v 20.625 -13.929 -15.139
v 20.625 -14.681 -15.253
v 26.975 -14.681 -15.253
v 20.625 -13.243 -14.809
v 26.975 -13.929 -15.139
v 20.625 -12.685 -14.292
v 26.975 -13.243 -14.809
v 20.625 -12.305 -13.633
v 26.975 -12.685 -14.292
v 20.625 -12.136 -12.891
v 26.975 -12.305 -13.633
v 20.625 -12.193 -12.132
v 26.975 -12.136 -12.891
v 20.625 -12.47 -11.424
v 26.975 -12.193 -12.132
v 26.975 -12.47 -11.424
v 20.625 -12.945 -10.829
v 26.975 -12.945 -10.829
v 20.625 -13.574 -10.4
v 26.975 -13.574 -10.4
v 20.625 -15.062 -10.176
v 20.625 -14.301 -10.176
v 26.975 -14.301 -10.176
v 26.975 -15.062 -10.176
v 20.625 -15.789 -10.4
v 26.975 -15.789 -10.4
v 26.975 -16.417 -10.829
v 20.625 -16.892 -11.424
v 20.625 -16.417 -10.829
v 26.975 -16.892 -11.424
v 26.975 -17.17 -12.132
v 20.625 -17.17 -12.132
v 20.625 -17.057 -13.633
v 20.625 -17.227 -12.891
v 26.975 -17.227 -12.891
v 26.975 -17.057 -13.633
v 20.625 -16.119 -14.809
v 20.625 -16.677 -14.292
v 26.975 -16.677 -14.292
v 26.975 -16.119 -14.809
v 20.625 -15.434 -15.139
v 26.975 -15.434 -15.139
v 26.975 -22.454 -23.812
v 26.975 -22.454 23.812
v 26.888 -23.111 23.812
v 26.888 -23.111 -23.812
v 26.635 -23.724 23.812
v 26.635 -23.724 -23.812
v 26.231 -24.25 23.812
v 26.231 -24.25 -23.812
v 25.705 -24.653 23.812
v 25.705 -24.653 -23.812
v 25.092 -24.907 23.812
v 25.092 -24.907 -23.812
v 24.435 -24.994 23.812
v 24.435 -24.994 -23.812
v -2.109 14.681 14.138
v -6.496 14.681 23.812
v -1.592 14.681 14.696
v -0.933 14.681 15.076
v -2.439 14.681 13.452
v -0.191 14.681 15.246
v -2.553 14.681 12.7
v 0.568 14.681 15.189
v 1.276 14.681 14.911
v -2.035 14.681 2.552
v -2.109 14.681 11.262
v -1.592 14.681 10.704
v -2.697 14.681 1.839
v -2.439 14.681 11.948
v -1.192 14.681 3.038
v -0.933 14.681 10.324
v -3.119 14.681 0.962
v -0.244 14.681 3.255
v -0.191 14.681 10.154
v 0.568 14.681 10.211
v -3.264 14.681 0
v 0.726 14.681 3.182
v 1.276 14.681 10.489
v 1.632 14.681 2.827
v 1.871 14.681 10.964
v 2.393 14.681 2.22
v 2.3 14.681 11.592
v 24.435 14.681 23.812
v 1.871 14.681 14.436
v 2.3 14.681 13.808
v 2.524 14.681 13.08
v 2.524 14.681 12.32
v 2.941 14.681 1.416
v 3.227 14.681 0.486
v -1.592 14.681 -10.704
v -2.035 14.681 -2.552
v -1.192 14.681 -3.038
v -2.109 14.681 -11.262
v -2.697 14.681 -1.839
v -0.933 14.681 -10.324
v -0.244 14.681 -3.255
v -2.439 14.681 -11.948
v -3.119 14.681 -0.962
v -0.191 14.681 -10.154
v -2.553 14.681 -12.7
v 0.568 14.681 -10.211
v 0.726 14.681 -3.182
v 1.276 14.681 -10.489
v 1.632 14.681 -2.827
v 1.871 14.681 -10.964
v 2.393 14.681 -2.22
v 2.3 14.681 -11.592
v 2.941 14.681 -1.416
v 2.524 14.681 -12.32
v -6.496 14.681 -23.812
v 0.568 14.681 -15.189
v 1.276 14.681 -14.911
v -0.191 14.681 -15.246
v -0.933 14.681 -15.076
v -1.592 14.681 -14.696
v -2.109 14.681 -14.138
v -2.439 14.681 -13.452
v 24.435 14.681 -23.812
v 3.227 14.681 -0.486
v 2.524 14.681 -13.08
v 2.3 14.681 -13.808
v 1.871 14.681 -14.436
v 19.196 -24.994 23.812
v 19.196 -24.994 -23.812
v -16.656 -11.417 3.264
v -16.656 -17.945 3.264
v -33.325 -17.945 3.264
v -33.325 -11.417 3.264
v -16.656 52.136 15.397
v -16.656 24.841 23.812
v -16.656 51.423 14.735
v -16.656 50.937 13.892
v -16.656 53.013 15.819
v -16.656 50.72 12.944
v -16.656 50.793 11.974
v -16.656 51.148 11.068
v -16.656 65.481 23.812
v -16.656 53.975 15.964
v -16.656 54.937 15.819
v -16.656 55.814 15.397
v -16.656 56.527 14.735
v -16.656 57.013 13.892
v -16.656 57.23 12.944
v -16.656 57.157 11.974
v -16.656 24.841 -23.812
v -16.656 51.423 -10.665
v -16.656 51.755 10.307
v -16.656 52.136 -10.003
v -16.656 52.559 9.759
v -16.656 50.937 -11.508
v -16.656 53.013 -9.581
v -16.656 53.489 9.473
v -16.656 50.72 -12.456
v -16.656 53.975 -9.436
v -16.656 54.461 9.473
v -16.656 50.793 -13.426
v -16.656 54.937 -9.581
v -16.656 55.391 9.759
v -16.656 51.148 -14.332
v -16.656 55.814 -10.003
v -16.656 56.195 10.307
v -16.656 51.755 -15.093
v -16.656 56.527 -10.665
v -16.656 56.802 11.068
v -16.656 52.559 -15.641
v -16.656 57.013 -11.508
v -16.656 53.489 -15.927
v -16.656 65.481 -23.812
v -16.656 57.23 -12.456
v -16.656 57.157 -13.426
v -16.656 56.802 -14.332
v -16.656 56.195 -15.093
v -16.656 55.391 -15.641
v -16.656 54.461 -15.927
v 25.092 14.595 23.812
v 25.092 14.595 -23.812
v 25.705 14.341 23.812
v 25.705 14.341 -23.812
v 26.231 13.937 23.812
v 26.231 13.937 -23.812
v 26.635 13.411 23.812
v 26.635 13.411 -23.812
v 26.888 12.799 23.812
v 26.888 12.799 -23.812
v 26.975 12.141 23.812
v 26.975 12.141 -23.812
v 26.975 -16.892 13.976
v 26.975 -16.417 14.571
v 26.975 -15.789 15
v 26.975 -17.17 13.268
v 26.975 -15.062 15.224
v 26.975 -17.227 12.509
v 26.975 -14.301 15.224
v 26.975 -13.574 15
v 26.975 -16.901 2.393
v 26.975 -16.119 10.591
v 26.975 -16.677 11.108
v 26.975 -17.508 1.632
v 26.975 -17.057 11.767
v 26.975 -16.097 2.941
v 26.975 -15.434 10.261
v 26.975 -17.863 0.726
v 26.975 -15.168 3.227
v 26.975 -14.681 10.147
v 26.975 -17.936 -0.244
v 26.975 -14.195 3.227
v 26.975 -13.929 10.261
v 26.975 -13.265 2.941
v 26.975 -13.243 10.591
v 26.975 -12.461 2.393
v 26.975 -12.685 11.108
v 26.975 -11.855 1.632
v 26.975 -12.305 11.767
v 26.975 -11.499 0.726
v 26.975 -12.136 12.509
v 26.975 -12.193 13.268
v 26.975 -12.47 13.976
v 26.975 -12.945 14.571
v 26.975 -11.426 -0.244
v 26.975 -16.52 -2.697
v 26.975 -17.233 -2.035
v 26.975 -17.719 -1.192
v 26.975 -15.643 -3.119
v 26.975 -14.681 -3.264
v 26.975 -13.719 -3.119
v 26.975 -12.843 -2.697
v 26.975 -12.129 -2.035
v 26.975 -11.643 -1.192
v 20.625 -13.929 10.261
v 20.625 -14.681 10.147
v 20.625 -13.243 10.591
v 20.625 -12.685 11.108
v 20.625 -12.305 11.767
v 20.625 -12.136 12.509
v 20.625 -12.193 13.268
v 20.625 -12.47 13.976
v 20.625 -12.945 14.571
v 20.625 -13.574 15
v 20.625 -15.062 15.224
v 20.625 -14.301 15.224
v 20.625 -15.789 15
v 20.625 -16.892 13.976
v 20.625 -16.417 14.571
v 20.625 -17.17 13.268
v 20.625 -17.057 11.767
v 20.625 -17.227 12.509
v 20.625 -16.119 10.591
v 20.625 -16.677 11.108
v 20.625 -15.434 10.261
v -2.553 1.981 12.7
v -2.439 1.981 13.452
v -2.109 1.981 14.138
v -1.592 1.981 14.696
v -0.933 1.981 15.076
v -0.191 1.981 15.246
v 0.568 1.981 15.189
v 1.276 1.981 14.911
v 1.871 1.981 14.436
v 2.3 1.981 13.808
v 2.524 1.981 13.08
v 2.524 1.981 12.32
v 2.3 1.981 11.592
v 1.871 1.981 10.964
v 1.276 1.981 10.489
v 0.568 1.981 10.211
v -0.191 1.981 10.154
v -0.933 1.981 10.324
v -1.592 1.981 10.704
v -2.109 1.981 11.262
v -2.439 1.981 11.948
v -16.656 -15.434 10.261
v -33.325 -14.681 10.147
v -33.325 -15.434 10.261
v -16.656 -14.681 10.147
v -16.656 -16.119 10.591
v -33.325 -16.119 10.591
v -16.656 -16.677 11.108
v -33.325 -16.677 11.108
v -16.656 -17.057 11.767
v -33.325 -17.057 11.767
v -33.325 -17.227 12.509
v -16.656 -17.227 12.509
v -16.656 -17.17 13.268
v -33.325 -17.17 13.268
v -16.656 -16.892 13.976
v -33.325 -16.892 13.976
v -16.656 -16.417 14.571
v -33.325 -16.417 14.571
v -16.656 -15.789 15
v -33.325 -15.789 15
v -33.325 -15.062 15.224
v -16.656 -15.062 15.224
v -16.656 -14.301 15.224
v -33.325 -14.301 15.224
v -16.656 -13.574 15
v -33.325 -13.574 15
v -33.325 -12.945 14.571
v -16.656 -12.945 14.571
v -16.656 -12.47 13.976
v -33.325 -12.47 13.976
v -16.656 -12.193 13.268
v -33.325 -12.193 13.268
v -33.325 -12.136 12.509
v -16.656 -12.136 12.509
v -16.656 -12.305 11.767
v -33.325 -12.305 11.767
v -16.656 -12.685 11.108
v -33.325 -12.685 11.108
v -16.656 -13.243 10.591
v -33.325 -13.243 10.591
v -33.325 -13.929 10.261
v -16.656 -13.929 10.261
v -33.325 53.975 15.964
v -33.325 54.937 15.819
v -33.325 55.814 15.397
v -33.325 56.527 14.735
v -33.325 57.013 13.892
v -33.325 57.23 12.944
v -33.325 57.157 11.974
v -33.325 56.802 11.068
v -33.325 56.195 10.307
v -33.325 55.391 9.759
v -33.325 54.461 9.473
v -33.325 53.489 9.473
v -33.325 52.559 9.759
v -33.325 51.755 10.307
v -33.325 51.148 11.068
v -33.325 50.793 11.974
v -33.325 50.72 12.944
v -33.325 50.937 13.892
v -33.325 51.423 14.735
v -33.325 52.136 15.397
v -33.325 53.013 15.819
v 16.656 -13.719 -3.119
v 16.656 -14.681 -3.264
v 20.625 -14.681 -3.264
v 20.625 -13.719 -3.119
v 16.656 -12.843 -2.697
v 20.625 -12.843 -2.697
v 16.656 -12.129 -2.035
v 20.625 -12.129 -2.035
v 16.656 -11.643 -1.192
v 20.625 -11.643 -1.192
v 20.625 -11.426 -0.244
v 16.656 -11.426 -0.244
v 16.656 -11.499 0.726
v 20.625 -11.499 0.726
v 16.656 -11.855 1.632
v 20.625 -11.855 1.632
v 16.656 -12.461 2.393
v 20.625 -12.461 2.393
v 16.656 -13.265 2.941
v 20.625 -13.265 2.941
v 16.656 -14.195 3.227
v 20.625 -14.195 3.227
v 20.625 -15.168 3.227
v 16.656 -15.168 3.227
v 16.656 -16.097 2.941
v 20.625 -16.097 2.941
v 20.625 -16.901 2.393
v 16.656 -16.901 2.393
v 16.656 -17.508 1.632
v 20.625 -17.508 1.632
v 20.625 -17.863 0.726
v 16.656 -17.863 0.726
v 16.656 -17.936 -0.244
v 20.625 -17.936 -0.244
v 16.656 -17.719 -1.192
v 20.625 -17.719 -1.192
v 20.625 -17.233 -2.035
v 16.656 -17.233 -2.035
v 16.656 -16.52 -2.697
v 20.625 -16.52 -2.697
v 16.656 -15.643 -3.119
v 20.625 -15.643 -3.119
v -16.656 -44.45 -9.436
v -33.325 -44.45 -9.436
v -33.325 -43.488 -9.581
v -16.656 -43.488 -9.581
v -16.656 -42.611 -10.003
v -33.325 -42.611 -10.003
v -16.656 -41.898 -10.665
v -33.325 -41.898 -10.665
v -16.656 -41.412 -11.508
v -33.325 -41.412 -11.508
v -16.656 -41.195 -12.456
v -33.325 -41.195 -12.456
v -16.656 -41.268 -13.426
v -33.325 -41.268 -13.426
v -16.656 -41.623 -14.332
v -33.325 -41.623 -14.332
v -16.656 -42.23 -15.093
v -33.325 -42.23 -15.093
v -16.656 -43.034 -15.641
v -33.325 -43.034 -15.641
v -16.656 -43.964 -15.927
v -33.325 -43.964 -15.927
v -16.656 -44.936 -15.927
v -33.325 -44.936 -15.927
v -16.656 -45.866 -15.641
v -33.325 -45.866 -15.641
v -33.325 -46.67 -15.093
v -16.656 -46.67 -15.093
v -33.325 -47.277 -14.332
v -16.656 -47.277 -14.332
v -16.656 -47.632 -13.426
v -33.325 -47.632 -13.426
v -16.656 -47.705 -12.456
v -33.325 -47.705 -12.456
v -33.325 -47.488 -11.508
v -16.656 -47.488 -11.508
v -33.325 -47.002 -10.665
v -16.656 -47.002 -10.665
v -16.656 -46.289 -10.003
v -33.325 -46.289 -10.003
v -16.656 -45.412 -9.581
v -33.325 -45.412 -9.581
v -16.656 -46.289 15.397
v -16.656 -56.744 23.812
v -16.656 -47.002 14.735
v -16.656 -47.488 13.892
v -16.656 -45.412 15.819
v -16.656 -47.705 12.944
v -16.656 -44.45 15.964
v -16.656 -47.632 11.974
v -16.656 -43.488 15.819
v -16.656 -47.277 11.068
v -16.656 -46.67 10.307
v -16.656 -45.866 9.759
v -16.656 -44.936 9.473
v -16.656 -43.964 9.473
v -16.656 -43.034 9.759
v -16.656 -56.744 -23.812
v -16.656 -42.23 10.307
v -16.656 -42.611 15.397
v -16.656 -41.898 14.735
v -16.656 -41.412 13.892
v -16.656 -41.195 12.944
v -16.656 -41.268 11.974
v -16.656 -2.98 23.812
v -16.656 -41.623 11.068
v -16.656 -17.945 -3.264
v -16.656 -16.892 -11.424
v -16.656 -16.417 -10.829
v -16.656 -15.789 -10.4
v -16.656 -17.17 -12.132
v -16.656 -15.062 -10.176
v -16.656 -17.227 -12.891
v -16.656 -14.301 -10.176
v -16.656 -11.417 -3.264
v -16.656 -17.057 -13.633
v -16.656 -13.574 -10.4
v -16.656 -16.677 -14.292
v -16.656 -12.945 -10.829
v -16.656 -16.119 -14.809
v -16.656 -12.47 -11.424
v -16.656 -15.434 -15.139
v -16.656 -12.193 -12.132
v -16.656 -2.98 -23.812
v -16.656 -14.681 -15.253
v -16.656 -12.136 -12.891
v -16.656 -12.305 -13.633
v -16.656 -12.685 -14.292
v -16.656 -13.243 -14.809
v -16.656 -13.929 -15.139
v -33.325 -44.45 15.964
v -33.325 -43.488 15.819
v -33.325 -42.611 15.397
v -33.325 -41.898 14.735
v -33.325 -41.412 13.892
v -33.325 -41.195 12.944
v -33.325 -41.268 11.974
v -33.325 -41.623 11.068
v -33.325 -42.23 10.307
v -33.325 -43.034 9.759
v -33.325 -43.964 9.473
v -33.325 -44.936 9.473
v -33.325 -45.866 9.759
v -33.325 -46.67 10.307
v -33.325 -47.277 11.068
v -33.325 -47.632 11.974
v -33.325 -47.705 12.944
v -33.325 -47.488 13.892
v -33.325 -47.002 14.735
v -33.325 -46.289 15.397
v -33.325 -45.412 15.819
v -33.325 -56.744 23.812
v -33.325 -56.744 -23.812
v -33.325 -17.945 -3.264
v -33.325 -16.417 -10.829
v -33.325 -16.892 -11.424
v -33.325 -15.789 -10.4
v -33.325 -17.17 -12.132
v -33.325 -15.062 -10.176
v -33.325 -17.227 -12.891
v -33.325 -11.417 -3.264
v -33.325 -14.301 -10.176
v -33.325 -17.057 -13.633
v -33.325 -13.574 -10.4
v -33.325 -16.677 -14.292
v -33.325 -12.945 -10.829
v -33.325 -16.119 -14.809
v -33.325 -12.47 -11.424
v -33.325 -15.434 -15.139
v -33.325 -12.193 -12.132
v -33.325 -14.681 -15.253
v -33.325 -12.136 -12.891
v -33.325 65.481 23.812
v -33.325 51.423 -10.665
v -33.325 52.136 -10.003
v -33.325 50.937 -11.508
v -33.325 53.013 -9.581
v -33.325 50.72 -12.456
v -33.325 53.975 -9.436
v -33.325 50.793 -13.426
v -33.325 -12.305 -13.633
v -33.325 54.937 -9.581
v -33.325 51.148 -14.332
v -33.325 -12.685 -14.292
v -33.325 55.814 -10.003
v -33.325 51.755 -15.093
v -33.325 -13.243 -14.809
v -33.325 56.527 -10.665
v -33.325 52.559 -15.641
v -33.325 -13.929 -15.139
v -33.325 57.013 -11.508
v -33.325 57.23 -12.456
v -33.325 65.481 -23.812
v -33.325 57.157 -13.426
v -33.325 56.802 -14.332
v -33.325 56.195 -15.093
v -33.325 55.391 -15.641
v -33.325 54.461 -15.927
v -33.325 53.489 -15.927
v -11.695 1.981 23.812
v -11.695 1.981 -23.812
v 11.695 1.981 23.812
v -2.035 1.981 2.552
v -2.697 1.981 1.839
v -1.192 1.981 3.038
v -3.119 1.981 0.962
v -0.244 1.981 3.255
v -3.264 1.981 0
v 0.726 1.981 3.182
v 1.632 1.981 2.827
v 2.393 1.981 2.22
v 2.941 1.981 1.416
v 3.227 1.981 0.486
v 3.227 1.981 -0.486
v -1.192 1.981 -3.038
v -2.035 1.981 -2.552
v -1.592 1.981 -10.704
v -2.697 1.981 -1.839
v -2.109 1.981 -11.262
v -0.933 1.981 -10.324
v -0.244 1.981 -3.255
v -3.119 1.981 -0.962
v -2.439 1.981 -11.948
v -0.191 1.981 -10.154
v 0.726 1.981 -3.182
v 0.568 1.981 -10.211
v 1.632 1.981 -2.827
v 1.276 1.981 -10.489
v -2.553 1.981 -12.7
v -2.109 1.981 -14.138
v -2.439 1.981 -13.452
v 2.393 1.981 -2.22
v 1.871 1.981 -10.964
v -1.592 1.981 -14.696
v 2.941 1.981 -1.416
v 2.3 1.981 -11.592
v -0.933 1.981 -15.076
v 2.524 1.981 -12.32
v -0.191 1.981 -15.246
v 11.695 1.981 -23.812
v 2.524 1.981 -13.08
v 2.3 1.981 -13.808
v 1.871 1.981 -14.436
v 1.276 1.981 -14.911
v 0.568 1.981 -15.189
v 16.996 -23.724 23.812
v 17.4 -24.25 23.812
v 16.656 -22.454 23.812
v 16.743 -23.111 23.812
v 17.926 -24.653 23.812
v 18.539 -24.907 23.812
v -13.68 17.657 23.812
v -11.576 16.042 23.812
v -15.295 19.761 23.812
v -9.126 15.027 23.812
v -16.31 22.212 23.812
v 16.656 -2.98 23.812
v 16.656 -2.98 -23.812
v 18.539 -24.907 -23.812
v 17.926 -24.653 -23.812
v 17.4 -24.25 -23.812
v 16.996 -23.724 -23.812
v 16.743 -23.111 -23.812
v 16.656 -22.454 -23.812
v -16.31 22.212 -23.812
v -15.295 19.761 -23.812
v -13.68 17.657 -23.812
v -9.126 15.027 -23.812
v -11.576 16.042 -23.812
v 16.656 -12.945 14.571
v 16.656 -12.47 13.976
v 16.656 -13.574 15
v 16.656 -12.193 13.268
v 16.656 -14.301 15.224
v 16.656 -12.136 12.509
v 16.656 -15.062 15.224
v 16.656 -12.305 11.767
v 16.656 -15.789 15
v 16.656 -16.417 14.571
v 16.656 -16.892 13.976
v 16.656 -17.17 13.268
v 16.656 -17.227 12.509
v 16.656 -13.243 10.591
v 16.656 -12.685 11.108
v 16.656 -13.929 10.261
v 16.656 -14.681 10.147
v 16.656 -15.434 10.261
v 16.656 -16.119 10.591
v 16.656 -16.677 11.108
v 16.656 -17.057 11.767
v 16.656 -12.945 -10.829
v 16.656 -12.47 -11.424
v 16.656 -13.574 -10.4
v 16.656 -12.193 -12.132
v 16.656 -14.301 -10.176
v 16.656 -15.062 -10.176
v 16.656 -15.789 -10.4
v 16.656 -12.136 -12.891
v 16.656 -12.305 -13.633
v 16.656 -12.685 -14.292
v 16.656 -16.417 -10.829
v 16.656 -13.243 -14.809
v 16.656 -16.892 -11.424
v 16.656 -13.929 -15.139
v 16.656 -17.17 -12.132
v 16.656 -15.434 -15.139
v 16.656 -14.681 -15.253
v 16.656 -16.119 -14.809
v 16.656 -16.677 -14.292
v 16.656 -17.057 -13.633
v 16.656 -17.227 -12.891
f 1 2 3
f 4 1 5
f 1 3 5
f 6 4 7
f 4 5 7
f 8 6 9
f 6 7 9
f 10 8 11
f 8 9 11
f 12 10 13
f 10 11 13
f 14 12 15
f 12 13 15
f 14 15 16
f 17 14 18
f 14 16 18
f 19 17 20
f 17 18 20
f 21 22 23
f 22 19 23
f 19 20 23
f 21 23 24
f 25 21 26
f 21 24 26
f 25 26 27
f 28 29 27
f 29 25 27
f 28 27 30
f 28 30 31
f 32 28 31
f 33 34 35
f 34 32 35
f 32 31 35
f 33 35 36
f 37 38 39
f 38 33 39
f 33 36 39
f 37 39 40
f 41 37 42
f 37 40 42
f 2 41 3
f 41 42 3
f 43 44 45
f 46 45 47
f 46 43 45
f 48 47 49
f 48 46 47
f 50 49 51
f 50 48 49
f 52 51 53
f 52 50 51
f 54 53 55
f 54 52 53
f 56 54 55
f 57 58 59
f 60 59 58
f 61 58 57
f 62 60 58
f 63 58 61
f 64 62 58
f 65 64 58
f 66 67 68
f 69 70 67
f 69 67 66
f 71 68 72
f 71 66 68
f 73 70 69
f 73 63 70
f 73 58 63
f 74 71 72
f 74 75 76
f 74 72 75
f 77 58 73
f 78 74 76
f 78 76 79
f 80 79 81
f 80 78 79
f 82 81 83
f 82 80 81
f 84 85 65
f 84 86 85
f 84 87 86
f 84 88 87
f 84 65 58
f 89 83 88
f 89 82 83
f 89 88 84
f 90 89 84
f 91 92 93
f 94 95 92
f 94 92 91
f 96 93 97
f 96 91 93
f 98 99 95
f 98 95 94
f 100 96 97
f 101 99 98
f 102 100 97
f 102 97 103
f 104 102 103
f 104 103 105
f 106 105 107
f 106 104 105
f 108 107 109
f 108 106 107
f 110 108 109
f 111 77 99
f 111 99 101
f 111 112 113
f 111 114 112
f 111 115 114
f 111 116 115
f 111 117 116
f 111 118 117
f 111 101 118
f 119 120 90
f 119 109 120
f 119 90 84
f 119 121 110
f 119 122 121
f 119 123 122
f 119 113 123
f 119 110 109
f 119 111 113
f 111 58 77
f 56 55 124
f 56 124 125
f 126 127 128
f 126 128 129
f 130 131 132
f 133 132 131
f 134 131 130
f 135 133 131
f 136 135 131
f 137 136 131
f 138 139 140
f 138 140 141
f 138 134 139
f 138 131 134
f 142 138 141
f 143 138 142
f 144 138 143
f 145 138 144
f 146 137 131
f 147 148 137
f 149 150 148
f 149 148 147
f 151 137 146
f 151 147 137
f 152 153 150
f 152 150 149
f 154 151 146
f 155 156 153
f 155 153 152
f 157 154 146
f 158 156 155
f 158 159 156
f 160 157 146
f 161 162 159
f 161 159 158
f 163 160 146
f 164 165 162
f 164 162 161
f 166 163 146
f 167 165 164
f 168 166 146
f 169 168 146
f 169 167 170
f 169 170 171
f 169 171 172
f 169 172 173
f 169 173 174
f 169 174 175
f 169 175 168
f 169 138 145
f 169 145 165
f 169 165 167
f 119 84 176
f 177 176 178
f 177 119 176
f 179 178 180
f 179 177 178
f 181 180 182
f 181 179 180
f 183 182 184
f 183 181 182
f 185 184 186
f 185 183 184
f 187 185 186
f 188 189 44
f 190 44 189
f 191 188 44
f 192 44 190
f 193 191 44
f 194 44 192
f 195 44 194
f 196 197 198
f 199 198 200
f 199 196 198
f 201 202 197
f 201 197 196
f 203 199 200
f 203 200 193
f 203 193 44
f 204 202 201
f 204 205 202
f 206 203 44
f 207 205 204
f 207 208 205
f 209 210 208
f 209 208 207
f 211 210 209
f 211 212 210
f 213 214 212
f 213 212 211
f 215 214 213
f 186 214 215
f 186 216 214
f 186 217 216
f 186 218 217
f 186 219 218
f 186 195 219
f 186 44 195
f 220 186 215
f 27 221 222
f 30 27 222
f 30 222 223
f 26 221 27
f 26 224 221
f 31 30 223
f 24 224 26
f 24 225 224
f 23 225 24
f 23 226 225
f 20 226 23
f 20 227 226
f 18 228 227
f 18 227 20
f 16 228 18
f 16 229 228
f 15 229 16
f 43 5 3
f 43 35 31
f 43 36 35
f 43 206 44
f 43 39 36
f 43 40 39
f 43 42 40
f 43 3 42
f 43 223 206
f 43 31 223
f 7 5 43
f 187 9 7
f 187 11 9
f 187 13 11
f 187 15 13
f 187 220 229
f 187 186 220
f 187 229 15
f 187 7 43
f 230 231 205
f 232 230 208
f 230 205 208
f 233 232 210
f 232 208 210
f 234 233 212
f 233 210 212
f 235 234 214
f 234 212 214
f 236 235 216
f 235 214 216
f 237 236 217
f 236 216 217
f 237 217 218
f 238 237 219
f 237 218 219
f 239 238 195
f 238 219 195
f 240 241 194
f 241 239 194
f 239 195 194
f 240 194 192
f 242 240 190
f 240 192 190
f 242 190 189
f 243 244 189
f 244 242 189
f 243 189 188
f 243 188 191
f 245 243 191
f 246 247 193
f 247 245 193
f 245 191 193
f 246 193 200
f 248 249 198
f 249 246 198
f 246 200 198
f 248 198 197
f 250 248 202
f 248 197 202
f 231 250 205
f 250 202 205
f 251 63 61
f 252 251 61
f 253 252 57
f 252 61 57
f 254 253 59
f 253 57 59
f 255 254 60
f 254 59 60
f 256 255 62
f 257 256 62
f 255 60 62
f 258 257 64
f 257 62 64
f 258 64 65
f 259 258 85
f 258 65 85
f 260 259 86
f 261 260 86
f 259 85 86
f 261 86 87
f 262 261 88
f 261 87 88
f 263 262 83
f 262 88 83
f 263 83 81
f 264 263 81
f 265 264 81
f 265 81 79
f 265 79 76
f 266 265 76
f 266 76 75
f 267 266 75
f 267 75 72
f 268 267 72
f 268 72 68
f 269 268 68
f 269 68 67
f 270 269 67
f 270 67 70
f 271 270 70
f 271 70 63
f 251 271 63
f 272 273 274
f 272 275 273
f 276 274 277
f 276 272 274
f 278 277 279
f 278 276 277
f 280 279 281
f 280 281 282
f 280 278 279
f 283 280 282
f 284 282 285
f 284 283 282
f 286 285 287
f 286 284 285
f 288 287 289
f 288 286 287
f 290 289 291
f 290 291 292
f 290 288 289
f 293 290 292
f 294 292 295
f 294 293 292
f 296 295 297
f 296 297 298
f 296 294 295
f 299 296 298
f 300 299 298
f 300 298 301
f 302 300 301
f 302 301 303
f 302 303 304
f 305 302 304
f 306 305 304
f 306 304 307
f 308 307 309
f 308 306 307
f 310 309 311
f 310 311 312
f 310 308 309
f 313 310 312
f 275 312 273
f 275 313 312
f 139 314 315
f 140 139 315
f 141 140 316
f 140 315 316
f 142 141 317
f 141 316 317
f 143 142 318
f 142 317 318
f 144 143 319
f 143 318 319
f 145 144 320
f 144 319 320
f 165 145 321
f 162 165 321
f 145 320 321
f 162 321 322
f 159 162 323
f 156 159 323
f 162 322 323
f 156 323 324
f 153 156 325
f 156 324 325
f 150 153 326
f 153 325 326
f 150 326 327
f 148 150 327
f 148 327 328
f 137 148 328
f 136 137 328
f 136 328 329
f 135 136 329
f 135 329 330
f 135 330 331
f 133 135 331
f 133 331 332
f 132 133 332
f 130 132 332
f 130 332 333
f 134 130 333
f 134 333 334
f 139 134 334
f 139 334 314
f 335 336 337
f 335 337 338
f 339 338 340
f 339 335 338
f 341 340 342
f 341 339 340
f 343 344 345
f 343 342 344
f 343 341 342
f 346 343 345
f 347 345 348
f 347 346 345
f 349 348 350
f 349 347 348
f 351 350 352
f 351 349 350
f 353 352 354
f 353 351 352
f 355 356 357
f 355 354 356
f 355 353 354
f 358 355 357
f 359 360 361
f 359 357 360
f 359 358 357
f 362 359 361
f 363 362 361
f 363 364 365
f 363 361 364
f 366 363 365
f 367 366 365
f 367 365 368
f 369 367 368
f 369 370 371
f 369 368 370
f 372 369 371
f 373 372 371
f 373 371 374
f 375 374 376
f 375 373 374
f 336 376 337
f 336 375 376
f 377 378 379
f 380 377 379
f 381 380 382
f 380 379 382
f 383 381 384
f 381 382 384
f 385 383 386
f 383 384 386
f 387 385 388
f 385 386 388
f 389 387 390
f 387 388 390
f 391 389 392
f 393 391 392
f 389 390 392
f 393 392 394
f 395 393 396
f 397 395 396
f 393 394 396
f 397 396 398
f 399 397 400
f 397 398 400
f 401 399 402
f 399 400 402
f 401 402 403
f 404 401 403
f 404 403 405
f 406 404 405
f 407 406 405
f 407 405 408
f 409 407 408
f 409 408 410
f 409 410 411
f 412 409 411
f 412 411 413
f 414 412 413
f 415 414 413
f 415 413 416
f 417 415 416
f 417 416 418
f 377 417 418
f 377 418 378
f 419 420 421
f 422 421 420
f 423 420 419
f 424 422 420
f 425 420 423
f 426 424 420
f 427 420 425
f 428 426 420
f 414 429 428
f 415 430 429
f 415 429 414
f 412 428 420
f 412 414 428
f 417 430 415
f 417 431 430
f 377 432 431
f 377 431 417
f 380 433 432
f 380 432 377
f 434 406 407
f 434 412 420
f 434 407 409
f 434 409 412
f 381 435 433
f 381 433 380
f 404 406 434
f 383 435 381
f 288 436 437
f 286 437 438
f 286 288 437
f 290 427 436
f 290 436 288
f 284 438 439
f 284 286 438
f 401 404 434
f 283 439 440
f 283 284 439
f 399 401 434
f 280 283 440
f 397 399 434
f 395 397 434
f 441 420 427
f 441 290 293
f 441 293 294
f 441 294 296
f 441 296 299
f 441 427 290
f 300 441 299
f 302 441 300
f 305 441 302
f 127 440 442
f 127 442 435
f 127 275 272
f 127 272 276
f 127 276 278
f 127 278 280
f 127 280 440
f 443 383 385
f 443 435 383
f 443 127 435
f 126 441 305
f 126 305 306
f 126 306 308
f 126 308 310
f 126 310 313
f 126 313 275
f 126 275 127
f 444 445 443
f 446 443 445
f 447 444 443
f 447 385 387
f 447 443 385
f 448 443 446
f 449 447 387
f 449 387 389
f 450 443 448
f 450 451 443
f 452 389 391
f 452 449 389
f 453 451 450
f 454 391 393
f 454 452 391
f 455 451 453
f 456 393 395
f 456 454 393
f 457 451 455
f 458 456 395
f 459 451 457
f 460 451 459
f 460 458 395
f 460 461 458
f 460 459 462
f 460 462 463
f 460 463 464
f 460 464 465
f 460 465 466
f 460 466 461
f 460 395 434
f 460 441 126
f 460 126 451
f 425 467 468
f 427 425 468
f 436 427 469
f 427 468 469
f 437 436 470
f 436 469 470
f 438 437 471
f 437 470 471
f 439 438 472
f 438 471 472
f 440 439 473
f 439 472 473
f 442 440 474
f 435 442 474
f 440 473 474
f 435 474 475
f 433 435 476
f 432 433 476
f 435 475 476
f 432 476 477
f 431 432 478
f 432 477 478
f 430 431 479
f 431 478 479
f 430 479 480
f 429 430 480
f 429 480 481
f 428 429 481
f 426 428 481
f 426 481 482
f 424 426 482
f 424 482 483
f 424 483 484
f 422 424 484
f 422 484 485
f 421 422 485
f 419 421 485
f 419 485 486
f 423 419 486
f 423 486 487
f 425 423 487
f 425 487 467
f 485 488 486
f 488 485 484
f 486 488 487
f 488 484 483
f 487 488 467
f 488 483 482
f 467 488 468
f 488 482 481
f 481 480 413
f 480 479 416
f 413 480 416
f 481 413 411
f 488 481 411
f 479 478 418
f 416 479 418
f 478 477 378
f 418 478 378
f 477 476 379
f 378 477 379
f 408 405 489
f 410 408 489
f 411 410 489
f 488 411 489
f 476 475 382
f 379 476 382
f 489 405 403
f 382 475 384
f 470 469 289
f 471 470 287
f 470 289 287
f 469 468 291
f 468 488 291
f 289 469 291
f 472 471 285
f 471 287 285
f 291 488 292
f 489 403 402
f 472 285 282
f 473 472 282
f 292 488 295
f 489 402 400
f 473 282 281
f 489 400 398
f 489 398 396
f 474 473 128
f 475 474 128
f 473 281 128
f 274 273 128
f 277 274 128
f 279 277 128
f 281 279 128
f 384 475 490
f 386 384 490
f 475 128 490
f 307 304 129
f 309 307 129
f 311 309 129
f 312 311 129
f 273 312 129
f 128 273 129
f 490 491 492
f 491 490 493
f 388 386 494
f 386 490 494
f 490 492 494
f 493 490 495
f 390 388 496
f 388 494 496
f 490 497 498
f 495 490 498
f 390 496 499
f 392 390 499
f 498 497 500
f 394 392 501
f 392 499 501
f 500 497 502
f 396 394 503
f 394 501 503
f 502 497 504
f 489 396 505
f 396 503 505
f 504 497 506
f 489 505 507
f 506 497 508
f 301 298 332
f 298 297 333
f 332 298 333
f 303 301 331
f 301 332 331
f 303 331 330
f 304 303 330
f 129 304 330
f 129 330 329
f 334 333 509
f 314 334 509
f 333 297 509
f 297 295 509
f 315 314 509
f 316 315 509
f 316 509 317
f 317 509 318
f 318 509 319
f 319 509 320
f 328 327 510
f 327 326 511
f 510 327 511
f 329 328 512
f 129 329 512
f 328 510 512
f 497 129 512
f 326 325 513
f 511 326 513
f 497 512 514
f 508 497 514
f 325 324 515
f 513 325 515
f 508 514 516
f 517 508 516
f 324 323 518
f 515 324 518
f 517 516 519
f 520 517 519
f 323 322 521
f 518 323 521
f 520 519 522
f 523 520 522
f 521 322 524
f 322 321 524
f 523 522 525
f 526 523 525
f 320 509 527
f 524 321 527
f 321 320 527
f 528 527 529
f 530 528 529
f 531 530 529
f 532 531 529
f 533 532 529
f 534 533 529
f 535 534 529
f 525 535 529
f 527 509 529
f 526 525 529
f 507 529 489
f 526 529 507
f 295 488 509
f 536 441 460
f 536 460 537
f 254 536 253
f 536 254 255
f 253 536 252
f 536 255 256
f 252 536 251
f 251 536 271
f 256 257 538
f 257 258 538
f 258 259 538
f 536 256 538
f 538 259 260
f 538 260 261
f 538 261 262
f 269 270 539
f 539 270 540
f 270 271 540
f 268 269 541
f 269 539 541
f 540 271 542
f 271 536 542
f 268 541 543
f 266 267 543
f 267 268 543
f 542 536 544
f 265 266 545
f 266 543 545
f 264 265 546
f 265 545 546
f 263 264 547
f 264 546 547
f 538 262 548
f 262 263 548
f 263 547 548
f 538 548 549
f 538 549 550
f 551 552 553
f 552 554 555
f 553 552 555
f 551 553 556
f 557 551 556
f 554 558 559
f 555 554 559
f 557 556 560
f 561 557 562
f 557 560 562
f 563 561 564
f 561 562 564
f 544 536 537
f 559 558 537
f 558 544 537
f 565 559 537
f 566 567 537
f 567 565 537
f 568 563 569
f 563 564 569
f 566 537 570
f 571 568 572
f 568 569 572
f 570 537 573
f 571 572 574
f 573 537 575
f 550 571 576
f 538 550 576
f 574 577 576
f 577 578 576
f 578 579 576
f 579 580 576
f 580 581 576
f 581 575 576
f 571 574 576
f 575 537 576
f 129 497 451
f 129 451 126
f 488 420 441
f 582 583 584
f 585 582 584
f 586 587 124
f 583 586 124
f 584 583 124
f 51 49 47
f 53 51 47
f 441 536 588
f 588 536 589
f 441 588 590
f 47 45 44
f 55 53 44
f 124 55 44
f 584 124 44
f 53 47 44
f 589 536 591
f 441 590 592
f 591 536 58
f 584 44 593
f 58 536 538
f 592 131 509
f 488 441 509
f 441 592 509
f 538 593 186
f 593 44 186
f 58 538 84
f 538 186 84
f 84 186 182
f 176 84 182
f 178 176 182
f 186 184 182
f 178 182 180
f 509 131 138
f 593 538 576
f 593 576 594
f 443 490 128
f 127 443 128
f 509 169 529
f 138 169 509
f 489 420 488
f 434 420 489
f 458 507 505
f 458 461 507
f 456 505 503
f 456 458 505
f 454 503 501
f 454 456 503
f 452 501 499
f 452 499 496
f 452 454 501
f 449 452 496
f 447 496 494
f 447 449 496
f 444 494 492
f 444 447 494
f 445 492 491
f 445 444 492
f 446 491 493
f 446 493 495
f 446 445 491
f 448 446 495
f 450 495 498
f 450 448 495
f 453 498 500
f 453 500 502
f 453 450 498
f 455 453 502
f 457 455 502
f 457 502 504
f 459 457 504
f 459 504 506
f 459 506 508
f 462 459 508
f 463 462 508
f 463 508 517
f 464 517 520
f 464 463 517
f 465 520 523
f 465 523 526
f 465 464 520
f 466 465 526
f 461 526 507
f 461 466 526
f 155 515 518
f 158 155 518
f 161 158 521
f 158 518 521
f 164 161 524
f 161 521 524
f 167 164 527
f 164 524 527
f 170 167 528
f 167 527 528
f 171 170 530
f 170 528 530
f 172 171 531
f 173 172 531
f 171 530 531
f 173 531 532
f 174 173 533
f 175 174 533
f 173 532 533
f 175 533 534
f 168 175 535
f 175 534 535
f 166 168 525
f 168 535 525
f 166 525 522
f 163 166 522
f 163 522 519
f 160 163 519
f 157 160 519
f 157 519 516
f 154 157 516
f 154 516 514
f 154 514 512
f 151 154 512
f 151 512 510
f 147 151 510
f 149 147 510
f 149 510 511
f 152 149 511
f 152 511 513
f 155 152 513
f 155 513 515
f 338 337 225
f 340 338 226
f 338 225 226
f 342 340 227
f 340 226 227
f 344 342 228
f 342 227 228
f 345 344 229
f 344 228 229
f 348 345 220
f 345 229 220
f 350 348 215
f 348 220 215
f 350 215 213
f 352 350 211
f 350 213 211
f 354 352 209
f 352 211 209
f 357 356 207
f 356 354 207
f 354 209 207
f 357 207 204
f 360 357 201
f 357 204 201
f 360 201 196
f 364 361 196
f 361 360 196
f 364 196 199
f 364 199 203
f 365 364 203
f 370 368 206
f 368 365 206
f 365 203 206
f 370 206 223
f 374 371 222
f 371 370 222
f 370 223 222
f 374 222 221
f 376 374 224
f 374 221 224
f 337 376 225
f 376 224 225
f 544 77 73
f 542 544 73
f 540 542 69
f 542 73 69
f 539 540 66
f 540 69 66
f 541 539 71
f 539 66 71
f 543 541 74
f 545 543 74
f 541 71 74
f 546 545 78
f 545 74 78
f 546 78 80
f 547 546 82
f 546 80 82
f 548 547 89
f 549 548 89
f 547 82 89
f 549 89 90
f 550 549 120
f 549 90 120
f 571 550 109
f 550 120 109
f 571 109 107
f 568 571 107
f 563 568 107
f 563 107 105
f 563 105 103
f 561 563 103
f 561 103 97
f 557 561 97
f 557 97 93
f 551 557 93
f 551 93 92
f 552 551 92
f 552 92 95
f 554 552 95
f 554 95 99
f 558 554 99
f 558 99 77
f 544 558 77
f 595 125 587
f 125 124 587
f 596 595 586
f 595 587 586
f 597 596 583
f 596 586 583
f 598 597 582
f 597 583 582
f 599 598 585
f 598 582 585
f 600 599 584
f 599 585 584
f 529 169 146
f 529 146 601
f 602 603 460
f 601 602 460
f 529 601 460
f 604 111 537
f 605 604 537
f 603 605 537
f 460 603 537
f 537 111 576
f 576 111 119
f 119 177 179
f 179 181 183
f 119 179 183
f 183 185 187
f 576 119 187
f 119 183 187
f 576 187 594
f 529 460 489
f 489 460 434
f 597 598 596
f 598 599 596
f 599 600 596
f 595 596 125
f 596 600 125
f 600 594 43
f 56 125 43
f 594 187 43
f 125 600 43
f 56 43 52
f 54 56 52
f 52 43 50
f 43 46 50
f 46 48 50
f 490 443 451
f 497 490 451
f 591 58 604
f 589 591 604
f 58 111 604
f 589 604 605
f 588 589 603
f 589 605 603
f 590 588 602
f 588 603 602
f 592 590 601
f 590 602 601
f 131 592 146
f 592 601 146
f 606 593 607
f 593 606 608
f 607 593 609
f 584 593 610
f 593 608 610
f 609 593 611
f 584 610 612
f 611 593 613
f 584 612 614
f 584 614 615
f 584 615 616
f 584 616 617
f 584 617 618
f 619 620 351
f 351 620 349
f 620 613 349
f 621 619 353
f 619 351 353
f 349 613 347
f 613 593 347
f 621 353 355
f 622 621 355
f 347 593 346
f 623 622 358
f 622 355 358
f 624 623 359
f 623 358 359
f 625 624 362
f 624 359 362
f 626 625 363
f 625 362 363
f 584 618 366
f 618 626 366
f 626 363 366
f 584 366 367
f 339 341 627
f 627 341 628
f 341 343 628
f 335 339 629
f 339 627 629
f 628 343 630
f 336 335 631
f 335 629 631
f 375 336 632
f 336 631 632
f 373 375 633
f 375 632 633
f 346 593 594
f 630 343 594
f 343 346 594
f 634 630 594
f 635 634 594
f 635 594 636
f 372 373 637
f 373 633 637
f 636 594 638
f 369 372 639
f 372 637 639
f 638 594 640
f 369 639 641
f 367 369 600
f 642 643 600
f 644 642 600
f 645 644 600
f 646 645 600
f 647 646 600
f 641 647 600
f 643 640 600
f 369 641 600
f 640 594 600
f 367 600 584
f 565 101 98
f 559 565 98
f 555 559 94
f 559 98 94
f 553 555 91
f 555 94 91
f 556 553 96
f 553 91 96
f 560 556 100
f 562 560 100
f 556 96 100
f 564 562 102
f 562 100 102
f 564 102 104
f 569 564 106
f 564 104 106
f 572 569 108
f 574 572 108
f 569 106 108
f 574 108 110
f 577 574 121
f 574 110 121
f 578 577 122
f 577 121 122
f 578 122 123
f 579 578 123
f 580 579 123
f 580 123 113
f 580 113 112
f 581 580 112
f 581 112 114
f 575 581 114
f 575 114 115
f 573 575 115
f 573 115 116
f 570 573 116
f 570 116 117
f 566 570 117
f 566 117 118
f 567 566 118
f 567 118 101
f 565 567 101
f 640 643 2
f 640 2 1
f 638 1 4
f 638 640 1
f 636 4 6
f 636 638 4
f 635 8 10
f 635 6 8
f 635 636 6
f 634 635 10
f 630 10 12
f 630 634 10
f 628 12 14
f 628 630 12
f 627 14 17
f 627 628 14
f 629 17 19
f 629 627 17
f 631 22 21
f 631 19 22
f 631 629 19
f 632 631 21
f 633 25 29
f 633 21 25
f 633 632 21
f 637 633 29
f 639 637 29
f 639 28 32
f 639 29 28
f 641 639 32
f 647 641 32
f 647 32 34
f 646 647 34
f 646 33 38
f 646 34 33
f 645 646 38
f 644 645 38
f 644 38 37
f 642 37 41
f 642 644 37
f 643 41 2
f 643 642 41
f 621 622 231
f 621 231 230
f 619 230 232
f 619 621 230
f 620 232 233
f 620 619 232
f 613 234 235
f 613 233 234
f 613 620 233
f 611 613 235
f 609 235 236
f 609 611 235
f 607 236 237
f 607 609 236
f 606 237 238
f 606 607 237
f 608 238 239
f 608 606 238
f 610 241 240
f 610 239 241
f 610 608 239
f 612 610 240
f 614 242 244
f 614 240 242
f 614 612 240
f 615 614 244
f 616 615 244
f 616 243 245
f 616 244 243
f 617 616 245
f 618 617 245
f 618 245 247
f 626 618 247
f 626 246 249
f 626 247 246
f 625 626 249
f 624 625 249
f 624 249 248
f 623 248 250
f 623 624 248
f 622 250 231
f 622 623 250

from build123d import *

# Parameters (mm, degrees)
BOSS_EXTRUDE1_DEPTH      = 23.8125
BOSS_EXTRUDE1_DEPTH_BACK = 23.8125
CUT_EXTRUDE1_DEPTH       = 41.213151732
CUT_EXTRUDE1_DEPTH_BACK  = 41.213151732
SKETCH6_R                = 2.5527
SKETCH6_R_2              = 3.2639
SKETCH7_R                = 1.5875
SKETCH7_W                = 6.5278
SKETCH7_H                = 6.5278
CUT_EXTRUDE2_DEPTH       = 41.213151732
SKETCH8_R                = 2.5527
CUT_EXTRUDE3_DEPTH       = 6.35
SKETCH14_R               = 3.2639
CUT_EXTRUDE6_DEPTH       = 46.858039931
SKETCH15_W               = 47.625
SKETCH15_H               = 33.3248
SKETCH15_R               = 2.5527
SKETCH15_W_2             = 6.5278
SKETCH15_H_2             = 6.5278
BOSS_EXTRUDE2_DEPTH      = 6.35
BOSS_EXTRUDE3_START      = 6.35
SKETCH16_W               = 47.625
SKETCH16_H               = 33.3248
SKETCH16_R               = 2.5527
SKETCH16_R_2             = 3.2639
BOSS_EXTRUDE3_DEPTH      = 6.35
BOSS_EXTRUDE4_START      = 6.35
SKETCH17_W               = 53.9496
SKETCH17_H               = 47.625
SKETCH17_R               = 2.5527
SKETCH17_R_2             = 3.2639
BOSS_EXTRUDE4_DEPTH      = 6.35
BOSS_EXTRUDE5_DEPTH      = 6.35
BOSS_EXTRUDE5_DEPTH_BACK = 10.31875
SKETCH19_R               = 2.5527
SKETCH19_W               = 6.5278
SKETCH19_H               = 6.5278
FILLET2_R                = 10.16
FILLET3_R                = 2.54
SKETCH20_R               = 3.2639
CUT_EXTRUDE7_DEPTH       = 93.145886885


with BuildPart() as part:
    # Sketch4 → Boss-Extrude1 (new, two sides: drawn at the far end of the back side and taken through both)
    with BuildSketch(Plane.XY.offset(-BOSS_EXTRUDE1_DEPTH_BACK)):
        Polygon((-20.6248, -24.9936), (-16.65605, -24.9936), (-16.65605, -2.9797375), (-11.6951125, 1.9812), (11.6951125, 1.9812), (16.65605, -2.9797375), (16.65605, -24.9936), (20.6248, -24.9936), (20.6248, 8.3312), (-20.6248, 8.3312), align=None)
    extrude(amount=BOSS_EXTRUDE1_DEPTH + BOSS_EXTRUDE1_DEPTH_BACK)

    # Sketch6 → Cut-Extrude1 (cut, two sides: drawn at the far end of the back side and taken through both)
    with BuildSketch(Plane(origin=(0, 0, 0), x_dir=(0, 0, -1), z_dir=(1, 0, 0)).offset(-CUT_EXTRUDE1_DEPTH_BACK)):
        with Locations((-12.7, -14.6812)):
            Circle(SKETCH6_R)
        with Locations((0, -14.6812)):
            Circle(SKETCH6_R_2)
        with Locations((12.7, -14.6812)):
            Circle(SKETCH6_R)
        with Locations((12.7, 16.6624)):
            Circle(SKETCH6_R_2)
        with Locations((-12.7, 16.6624)):
            Circle(SKETCH6_R_2)
    extrude(amount=CUT_EXTRUDE1_DEPTH + CUT_EXTRUDE1_DEPTH_BACK, mode=Mode.SUBTRACT)

    # Sketch7 → Cut-Extrude2 (cut, through all)
    with BuildSketch(Plane(origin=(0, 0, 0), x_dir=(0, 0, -1), z_dir=(1, 0, 0))):
        with Locations((-12.7, -14.6812)):
            Circle(SKETCH7_R)
        with Locations((12.7, -14.6812)):
            Circle(SKETCH7_R)
        with Locations((0, -14.6812)):
            Rectangle(SKETCH7_W, SKETCH7_H)
    extrude(amount=-CUT_EXTRUDE2_DEPTH, mode=Mode.SUBTRACT)

    # Sketch8 → Cut-Extrude3 (cut)
    with BuildSketch(Plane(origin=(0, 8.3312, 0), x_dir=(1, 0, 0), z_dir=(0, 1, 0))):
        with Locations(Location((0, 12.7, 0), (0, 0, 180))):
            Circle(SKETCH8_R)
        with Locations(Location((0, -12.7, 0), (0, 0, 180))):
            Circle(SKETCH8_R)
    extrude(amount=-CUT_EXTRUDE3_DEPTH, mode=Mode.SUBTRACT)

    # Sketch14 → Cut-Extrude6 (cut, through all)
    with BuildSketch(Plane(origin=(0, 8.3312, 0), x_dir=(1, 0, 0), z_dir=(0, 1, 0))):
        with Locations(Location((0, 0, 0), (0, 0, 180))):
            Circle(SKETCH14_R)
    extrude(amount=-CUT_EXTRUDE6_DEPTH, mode=Mode.SUBTRACT)

    # Sketch15 → Boss-Extrude2 (add)
    with BuildSketch(Plane.ZY.offset(20.6248)):
        with Locations((0, -8.3312)):
            Rectangle(SKETCH15_W, SKETCH15_H)
        with Locations(Location((12.7, -14.6812, 0), (0, 0, 180))):
            Circle(SKETCH15_R, mode=Mode.SUBTRACT)
        with Locations(Location((-12.7, -14.6812, 0), (0, 0, 180))):
            Circle(SKETCH15_R, mode=Mode.SUBTRACT)
        with Locations((0, -14.6812)):
            Rectangle(SKETCH15_W_2, SKETCH15_H_2, mode=Mode.SUBTRACT)
    extrude(amount=BOSS_EXTRUDE2_DEPTH)

    # Sketch16 → Boss-Extrude3 (add)
    with BuildSketch(Plane(origin=(20.6248, 0, 0), x_dir=(0, 0, -1), z_dir=(1, 0, 0)).offset(BOSS_EXTRUDE3_START)):
        with Locations((0, -8.3312)):
            Rectangle(SKETCH16_W, SKETCH16_H)
        with Locations((-12.7, -14.6812)):
            Circle(SKETCH16_R, mode=Mode.SUBTRACT)
        with Locations((0, -14.6812)):
            Circle(SKETCH16_R_2, mode=Mode.SUBTRACT)
        with Locations((12.7, -14.6812)):
            Circle(SKETCH16_R, mode=Mode.SUBTRACT)
    extrude(amount=-BOSS_EXTRUDE3_DEPTH)

    # Sketch17 → Boss-Extrude4 (add)
    with BuildSketch(Plane(origin=(0, 8.3312, 0), x_dir=(1, 0, 0), z_dir=(0, 1, 0)).offset(BOSS_EXTRUDE4_START)):
        Rectangle(SKETCH17_W, SKETCH17_H)
        with Locations(Location((0, -12.7, 0), (0, 0, 180))):
            Circle(SKETCH17_R, mode=Mode.SUBTRACT)
        with Locations(Location((0, 12.7, 0), (0, 0, 180))):
            Circle(SKETCH17_R, mode=Mode.SUBTRACT)
        with Locations(Location((0, 0, 0), (0, 0, 180))):
            Circle(SKETCH17_R_2, mode=Mode.SUBTRACT)
    extrude(amount=-BOSS_EXTRUDE4_DEPTH)

    # Sketch19 → Boss-Extrude5 (add, two sides: drawn at the far end of the back side and taken through both)
    with BuildSketch(Plane.ZY.offset(26.9748).offset(-BOSS_EXTRUDE5_DEPTH_BACK)):
        Polygon((-23.8125, 14.6812), (-23.8125, 65.4812), (23.8125, 65.4812), (23.8125, 14.6812), (23.8125, -24.9936), (23.8125, -56.7436), (-23.8125, -56.7436), (-23.8125, -24.9936), align=None)
        with Locations(Location((12.7, -14.6812, 0), (0, 0, 180))):
            Circle(SKETCH19_R, mode=Mode.SUBTRACT)
        with Locations(Location((-12.7, -14.6812, 0), (0, 0, 180))):
            Circle(SKETCH19_R, mode=Mode.SUBTRACT)
        with Locations((0, -14.6812)):
            Rectangle(SKETCH19_W, SKETCH19_H, mode=Mode.SUBTRACT)
    extrude(amount=BOSS_EXTRUDE5_DEPTH + BOSS_EXTRUDE5_DEPTH_BACK)

    # Fillet2
    fillet2_edges = [part.edges().sort_by_distance(p)[0] for p in [
        (-16.65605, 14.6812, 0),
    ]]
    fillet(fillet2_edges, radius=FILLET2_R)

    # Fillet3
    fillet3_edges = [part.edges().sort_by_distance(p)[0] for p in [
        (16.65605, -24.9936, 0),
        (26.9748, -24.9936, 0),
        (26.9748, 14.6812, 0),
    ]]
    fillet(fillet3_edges, radius=FILLET3_R)

    # Sketch20 → Cut-Extrude7 (cut, through all)
    with BuildSketch(Plane.ZY.offset(33.3248)):
        with Locations((-12.7, 53.975)):
            Circle(SKETCH20_R)
        with Locations((-12.7, -44.45)):
            Circle(SKETCH20_R)
        with Locations((12.7, 53.975)):
            Circle(SKETCH20_R)
        with Locations((12.7, -44.45)):
            Circle(SKETCH20_R)
    extrude(amount=-CUT_EXTRUDE7_DEPTH, mode=Mode.SUBTRACT)


solid = part.part
